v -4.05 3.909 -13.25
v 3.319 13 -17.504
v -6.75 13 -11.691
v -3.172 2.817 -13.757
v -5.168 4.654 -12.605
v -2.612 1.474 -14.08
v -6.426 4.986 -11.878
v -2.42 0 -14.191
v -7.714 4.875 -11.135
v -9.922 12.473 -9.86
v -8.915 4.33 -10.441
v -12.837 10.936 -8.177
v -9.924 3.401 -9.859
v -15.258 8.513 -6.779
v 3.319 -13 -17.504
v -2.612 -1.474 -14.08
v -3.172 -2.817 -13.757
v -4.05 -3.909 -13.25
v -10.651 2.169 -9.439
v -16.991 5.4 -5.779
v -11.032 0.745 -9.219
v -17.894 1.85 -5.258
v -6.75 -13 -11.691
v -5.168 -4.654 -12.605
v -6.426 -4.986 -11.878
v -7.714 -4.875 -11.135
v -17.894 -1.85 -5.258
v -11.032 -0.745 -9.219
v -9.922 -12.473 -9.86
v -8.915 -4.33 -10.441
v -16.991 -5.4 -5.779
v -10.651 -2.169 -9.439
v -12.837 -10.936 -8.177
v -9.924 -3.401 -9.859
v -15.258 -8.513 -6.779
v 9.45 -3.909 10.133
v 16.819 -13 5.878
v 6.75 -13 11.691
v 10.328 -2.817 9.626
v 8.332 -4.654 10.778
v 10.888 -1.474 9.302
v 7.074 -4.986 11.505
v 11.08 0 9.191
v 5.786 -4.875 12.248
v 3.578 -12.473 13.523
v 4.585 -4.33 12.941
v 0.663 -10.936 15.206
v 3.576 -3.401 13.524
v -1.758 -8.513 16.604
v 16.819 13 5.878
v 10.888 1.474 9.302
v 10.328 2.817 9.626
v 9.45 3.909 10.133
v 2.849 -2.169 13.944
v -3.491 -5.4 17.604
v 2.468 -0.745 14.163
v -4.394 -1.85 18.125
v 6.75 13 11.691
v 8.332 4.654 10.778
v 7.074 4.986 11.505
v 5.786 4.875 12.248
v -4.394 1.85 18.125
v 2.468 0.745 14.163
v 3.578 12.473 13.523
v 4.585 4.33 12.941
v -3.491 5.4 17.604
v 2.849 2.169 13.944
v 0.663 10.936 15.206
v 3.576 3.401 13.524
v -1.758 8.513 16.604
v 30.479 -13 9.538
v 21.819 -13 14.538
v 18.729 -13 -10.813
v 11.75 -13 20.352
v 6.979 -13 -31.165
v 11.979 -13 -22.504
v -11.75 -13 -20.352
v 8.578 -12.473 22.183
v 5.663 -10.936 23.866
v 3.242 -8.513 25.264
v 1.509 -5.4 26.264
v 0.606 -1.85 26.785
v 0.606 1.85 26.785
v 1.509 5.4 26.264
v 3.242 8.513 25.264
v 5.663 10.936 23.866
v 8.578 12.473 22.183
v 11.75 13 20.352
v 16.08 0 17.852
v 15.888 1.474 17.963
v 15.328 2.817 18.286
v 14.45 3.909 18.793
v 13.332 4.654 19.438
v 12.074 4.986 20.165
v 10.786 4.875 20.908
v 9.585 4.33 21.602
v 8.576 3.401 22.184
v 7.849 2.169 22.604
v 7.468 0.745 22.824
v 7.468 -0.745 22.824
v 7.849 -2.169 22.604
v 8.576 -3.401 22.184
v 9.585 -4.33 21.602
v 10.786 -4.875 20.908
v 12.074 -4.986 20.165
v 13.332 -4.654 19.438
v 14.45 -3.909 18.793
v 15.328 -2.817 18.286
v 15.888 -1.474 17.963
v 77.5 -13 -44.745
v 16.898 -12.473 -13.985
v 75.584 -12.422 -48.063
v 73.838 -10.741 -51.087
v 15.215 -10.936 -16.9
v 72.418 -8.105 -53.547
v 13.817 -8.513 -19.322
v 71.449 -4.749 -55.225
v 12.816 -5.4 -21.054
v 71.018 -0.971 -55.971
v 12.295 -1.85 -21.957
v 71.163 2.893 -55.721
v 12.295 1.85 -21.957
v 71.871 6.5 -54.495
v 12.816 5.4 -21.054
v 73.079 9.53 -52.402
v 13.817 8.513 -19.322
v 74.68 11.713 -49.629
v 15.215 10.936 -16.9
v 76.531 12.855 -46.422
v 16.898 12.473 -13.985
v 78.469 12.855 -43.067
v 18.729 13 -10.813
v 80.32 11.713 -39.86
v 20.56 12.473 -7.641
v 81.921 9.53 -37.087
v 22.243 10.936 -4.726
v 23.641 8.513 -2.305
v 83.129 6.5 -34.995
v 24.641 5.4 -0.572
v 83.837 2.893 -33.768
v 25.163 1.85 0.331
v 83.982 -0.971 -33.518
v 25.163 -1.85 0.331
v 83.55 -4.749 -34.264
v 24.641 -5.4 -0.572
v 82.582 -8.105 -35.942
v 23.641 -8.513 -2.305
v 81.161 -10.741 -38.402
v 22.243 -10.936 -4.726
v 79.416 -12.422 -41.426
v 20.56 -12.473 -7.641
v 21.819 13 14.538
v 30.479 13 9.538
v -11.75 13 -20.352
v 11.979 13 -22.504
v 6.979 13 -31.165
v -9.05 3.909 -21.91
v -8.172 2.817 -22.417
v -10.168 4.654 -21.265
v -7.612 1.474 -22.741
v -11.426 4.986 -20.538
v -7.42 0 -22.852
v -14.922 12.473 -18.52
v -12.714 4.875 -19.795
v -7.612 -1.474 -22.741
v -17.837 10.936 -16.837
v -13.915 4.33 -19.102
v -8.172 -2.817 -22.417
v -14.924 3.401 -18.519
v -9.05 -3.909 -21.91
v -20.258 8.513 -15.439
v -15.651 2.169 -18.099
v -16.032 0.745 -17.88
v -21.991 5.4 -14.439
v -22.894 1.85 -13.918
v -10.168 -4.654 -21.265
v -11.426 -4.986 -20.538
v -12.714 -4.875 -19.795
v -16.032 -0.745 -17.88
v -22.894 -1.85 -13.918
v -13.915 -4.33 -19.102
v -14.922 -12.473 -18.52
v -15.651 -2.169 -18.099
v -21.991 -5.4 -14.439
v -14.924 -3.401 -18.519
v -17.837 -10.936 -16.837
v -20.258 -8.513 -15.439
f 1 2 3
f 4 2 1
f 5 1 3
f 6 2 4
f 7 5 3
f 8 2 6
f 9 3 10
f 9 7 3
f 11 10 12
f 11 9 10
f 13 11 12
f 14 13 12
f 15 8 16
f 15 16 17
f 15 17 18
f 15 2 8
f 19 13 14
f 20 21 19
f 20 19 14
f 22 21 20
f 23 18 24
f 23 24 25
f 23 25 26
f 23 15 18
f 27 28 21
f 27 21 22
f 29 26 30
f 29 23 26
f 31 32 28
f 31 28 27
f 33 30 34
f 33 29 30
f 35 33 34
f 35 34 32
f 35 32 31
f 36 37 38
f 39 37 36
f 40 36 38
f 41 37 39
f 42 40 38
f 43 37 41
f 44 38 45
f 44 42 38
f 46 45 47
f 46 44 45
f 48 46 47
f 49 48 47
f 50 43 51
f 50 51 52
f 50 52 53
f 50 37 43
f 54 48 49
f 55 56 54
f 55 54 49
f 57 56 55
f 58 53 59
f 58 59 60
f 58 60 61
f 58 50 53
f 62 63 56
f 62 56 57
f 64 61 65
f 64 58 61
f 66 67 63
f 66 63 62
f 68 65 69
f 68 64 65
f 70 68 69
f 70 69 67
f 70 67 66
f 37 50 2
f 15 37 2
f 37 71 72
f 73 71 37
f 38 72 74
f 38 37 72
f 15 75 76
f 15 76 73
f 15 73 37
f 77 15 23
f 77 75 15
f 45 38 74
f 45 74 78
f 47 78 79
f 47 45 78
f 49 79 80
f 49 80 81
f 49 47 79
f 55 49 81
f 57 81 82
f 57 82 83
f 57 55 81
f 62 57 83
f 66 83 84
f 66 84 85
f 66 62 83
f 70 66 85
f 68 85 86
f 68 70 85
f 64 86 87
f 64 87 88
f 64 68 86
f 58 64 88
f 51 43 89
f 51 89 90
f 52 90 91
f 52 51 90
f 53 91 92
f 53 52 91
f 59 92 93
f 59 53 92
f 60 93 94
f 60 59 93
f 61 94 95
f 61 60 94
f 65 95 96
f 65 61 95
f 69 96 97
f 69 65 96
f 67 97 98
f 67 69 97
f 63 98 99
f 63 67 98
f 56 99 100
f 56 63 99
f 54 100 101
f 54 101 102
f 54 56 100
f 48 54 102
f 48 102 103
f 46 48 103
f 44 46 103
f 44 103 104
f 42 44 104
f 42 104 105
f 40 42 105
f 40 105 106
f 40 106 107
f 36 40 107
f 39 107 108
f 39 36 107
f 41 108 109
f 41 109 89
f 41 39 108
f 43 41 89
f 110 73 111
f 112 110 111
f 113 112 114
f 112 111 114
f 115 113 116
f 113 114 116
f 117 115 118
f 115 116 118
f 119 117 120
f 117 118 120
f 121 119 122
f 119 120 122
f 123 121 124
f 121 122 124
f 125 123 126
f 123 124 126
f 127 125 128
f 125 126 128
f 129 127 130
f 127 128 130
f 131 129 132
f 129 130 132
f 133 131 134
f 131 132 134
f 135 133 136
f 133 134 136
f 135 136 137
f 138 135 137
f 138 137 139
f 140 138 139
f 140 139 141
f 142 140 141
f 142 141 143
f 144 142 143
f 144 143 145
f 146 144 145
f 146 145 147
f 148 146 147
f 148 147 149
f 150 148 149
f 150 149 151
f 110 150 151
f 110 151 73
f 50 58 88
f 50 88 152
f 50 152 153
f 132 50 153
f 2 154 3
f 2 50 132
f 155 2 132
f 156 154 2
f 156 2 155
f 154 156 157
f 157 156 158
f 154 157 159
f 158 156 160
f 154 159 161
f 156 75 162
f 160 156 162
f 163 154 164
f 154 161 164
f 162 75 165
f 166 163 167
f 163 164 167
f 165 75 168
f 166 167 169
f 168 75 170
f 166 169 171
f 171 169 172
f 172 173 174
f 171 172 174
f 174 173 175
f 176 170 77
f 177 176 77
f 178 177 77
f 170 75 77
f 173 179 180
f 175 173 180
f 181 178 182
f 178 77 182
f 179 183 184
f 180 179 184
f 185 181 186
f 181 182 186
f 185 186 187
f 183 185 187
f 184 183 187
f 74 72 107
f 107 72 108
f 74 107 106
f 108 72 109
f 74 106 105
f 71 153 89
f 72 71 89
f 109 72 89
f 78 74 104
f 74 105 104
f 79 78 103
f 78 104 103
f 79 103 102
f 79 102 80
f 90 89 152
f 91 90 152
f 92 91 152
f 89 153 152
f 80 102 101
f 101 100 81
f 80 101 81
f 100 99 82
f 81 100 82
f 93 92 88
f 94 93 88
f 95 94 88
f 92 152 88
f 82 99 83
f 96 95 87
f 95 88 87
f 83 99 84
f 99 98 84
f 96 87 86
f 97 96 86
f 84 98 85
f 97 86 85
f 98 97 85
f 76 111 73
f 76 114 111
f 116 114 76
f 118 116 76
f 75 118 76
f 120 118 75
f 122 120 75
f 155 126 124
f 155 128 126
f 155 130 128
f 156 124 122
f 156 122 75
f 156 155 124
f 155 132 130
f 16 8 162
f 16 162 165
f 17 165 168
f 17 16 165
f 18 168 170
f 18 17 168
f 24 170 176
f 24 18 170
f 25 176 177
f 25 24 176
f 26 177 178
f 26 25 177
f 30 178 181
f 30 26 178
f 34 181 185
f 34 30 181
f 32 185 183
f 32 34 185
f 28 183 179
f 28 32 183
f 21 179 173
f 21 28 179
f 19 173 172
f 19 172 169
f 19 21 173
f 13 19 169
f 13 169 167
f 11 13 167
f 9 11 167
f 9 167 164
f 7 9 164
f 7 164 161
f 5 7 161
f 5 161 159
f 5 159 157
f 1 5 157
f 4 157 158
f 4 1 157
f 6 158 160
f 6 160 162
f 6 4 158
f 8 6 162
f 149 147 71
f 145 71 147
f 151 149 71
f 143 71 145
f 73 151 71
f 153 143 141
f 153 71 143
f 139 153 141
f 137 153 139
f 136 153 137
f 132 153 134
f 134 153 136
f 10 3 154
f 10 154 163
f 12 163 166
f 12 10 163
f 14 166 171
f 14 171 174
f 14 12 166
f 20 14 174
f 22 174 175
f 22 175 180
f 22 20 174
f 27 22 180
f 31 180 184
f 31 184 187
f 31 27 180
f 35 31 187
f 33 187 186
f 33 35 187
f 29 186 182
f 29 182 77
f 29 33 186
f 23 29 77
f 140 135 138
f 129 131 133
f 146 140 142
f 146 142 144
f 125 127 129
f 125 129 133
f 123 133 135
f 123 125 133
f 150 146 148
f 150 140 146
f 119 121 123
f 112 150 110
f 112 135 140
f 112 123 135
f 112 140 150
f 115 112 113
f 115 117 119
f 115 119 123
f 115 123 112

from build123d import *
from build123d.topology import SkipClean

# Parameters (mm, degrees)
BOSS_EXTRUDE1_DEPTH = 25
SKETCH2_R           = 8
CUT_EXTRUDE1_DEPTH  = 110
CUT_EXTRUDE2_DEPTH  = 150
BOSS_EXTRUDE2_START = 21.60254038
BOSS_EXTRUDE2_DEPTH = 21.60254038
SKETCH5_R           = 13
CUT_EXTRUDE3_DEPTH  = 50
SKETCH6_R           = 13
BOSS_EXTRUDE3_DEPTH = 100
SKETCH7_R           = 5
CUT_EXTRUDE4_DEPTH  = 50
SKETCH8_R           = 13
SKETCH8_R_2         = 5
BOSS_EXTRUDE4_DEPTH = 13
CUT_EXTRUDE5_DEPTH  = 28
SKETCH10_R          = 5
BOSS_EXTRUDE5_DEPTH = 10
CIRPATTERN2_COUNT   = 2
SKETCH11_W          = 47
SKETCH11_H          = 26
BOSS_EXTRUDE6_DEPTH = 10
SKETCH12_R          = 13
BOSS_EXTRUDE7_DEPTH = 67.86279097


with BuildPart() as part:
    # Sketch1 → Boss-Extrude1 (new, symmetric)
    with BuildSketch(Plane(origin=(0, 0, 0), x_dir=(1, 0, 0), z_dir=(0, 1, 0))):
        Polygon((86.602540378, 150), (103.923048454, 160), (114.724318643, 141.291651246), (93.073683549, 128.791651246), (158.073683549, 16.208348754), (179.724318643, 28.708348754), (190.525588833, 10), (173.205080757, 0), (45.59802172, 0), (22.79901086, 39.489045172), align=None)
    extrude(amount=BOSS_EXTRUDE1_DEPTH, both=True)

    # Sketch2 → Cut-Extrude1 (cut, symmetric)
    with BuildSketch(Plane(origin=(140.729128115, 0, -81.25), x_dir=(0.8660254037844386, 0, -0.5000000000000003), z_dir=(0.5000000000000003, 0, 0.8660254037844386))):
        Circle(SKETCH2_R)
    extrude(amount=CUT_EXTRUDE1_DEPTH, both=True, mode=Mode.SUBTRACT)

    # Sketch3 → Cut-Extrude2 (cut, symmetric)
    with BuildSketch(Plane(origin=(140.729128115, 0, -81.25), x_dir=(0.8660254037844386, 0, -0.5000000000000003), z_dir=(0.5000000000000003, 0, 0.8660254037844386))):
        with BuildLine():
            Line((0, 18), (-12.5, 18))
            Line((-12.5, 18), (-12.5, 31.312178452))
            Line((-12.5, 31.312178452), (23.905899442, 31.312178452))
            Line((23.905899442, 31.312178452), (23.905899442, -29.505210198))
            Line((23.905899442, -29.505210198), (-12.5, -29.505210198))
            Line((-12.5, -29.505210198), (-12.5, -18))
            Line((-12.5, -18), (0, -18))
            ThreePointArc((0, -18), (18, 0), (0, 18))
        make_face()
    extrude(amount=CUT_EXTRUDE2_DEPTH, both=True, mode=Mode.SUBTRACT)

    # Sketch4 → Boss-Extrude2 (add)
    with SkipClean():  # the faces are left unmerged after this step: merging them gives an invalid solid
        with BuildSketch(Plane(origin=(173.229128115, 0, -24.958348754), x_dir=(0.8660254037844386, 0, -0.5000000000000003), z_dir=(0.5000000000000003, 0, 0.8660254037844386)).offset(BOSS_EXTRUDE2_START)):
            with BuildLine():
                Line((7.5, 16.363068172), (7.5, 2.783882181))
                ThreePointArc((7.5, 2.783882181), (8, 0), (7.5, -2.783882181))
                Line((7.5, -2.783882181), (7.5, -16.363068172))
                ThreePointArc((7.5, -16.363068172), (18, 0), (7.5, 16.363068172))
            make_face()
        boss_extrude2 = extrude(amount=-BOSS_EXTRUDE2_DEPTH)

    # Mirror2: Boss-Extrude2 across plane
    with SkipClean():  # the faces are left unmerged after this step: merging them gives an invalid solid
        add(boss_extrude2.mirror(Plane(origin=(140.729128115, 0, -81.25), x_dir=(-0.8660254037844388, 0, 0.5), z_dir=(0.5000000000000003, 0, 0.8660254037844386))))

    # Sketch5 → Cut-Extrude3 (cut)
    with SkipClean():  # the faces are left unmerged after this step: merging them gives an invalid solid
        with BuildSketch(Plane(origin=(34.19851629, 0, -19.744522586), x_dir=(0.5000000000000001, 0, 0.8660254037844386), z_dir=(-0.8660254037844386, 0, 0.5000000000000001))):
            Circle(SKETCH5_R)
        extrude(amount=-CUT_EXTRUDE3_DEPTH, mode=Mode.SUBTRACT)


with BuildPart() as body_2:
    # Sketch6 → Boss-Extrude3 (new body)
    with BuildSketch(Plane(origin=(77.499786479, 0, -44.744522586), x_dir=(0.5000000000000001, 0, 0.8660254037844386), z_dir=(-0.8660254037844386, 0, 0.5000000000000001))):
        Circle(SKETCH6_R)
    extrude(amount=BOSS_EXTRUDE3_DEPTH)

    # Sketch7 → Cut-Extrude4 (cut, symmetric)
    with BuildSketch(Plane(origin=(140.729128115, 0, -81.25), x_dir=(0.8660254037844386, 0, -0.5000000000000003), z_dir=(0.5000000000000003, 0, 0.8660254037844386))):
        with Locations((-162.5, 0)):
            Circle(SKETCH7_R)
    extrude(amount=CUT_EXTRUDE4_DEPTH, both=True, mode=Mode.SUBTRACT)

    # Sketch8 → Boss-Extrude4 (add, symmetric)
    with BuildSketch(Plane(origin=(140.729128115, 0, -81.25), x_dir=(0.8660254037844386, 0, -0.5000000000000003), z_dir=(0.5000000000000003, 0, 0.8660254037844386))):
        with Locations((-162.5, 0)):
            Circle(SKETCH8_R)
        with Locations((-162.5, 0)):
            Circle(SKETCH8_R_2, mode=Mode.SUBTRACT)
    extrude(amount=BOSS_EXTRUDE4_DEPTH, both=True)

    # Sketch9 → Cut-Extrude5 (cut, symmetric)
    with BuildSketch(Plane(origin=(140.729128115, 0, -81.25), x_dir=(0.8660254037844386, 0, -0.5000000000000003), z_dir=(0.5000000000000003, 0, 0.8660254037844386))):
        with BuildLine():
            Line((-162.5, 13), (-162.5, 18.834095503))
            ThreePointArc((-162.5, 18.834095503), (-181.334095503, 0), (-162.5, -18.834095503))
            Line((-162.5, -18.834095503), (-162.5, -13))
            ThreePointArc((-162.5, -13), (-175.5, 0), (-162.5, 13))
        make_face()
    extrude(amount=CUT_EXTRUDE5_DEPTH, both=True, mode=Mode.SUBTRACT)


with BuildPart() as body_2_2:
    # Sketch10 → Boss-Extrude5 (new body)
    with BuildSketch(Plane(origin=(6.75, 0, 11.691342951), x_dir=(0.8660254037844385, 0, -0.5000000000000004), z_dir=(0.5000000000000003, 0, 0.8660254037844384))):
        with BuildLine():
            Line((0, 13), (21.626254201, 13))
            Line((21.626254201, 13), (21.626254201, -13))
            Line((21.626254201, -13), (0, -13))
            ThreePointArc((0, -13), (-13, 0), (0, 13))
        make_face()
        Circle(SKETCH10_R, mode=Mode.SUBTRACT)
    extrude(amount=BOSS_EXTRUDE5_DEPTH)


with BuildPart() as cirpattern2_1:
    # CirPattern2: pattern copy
    add(body_2_2.part.rotate(Axis((24.24994662, 0, -14.000713209), (0.8660254037844386, 0, -0.5000000000000003)), 1 * 360 / CIRPATTERN2_COUNT))


with BuildPart() as body_4:
    # Sketch11 → Boss-Extrude6 (new body)
    with BuildSketch(Plane(origin=(18.728885527, 0, -10.8131271), x_dir=(-0.5000000000000004, 0, -0.8660254037844385), z_dir=(0.8660254037844384, 0, -0.5000000000000003))):
        Rectangle(SKETCH11_W, SKETCH11_H)
    extrude(amount=-BOSS_EXTRUDE6_DEPTH)


with BuildPart() as body_5:
    # Sketch12 → Boss-Extrude7 (new body)
    with BuildSketch(Plane(origin=(18.728885527, 0, -10.8131271), x_dir=(-0.5000000000000004, 0, -0.8660254037844385), z_dir=(0.8660254037844384, 0, -0.5000000000000003))):
        Circle(SKETCH12_R)
    extrude(amount=BOSS_EXTRUDE7_DEPTH)


with BuildPart() as cirpattern2_1_1:
    add(cirpattern2_1.part)

    # Combine2: union body 4, body 5, body 2 2
    add(body_4.part)
    add(body_5.part)
    add(body_2_2.part)


solid = cirpattern2_1_1.part
